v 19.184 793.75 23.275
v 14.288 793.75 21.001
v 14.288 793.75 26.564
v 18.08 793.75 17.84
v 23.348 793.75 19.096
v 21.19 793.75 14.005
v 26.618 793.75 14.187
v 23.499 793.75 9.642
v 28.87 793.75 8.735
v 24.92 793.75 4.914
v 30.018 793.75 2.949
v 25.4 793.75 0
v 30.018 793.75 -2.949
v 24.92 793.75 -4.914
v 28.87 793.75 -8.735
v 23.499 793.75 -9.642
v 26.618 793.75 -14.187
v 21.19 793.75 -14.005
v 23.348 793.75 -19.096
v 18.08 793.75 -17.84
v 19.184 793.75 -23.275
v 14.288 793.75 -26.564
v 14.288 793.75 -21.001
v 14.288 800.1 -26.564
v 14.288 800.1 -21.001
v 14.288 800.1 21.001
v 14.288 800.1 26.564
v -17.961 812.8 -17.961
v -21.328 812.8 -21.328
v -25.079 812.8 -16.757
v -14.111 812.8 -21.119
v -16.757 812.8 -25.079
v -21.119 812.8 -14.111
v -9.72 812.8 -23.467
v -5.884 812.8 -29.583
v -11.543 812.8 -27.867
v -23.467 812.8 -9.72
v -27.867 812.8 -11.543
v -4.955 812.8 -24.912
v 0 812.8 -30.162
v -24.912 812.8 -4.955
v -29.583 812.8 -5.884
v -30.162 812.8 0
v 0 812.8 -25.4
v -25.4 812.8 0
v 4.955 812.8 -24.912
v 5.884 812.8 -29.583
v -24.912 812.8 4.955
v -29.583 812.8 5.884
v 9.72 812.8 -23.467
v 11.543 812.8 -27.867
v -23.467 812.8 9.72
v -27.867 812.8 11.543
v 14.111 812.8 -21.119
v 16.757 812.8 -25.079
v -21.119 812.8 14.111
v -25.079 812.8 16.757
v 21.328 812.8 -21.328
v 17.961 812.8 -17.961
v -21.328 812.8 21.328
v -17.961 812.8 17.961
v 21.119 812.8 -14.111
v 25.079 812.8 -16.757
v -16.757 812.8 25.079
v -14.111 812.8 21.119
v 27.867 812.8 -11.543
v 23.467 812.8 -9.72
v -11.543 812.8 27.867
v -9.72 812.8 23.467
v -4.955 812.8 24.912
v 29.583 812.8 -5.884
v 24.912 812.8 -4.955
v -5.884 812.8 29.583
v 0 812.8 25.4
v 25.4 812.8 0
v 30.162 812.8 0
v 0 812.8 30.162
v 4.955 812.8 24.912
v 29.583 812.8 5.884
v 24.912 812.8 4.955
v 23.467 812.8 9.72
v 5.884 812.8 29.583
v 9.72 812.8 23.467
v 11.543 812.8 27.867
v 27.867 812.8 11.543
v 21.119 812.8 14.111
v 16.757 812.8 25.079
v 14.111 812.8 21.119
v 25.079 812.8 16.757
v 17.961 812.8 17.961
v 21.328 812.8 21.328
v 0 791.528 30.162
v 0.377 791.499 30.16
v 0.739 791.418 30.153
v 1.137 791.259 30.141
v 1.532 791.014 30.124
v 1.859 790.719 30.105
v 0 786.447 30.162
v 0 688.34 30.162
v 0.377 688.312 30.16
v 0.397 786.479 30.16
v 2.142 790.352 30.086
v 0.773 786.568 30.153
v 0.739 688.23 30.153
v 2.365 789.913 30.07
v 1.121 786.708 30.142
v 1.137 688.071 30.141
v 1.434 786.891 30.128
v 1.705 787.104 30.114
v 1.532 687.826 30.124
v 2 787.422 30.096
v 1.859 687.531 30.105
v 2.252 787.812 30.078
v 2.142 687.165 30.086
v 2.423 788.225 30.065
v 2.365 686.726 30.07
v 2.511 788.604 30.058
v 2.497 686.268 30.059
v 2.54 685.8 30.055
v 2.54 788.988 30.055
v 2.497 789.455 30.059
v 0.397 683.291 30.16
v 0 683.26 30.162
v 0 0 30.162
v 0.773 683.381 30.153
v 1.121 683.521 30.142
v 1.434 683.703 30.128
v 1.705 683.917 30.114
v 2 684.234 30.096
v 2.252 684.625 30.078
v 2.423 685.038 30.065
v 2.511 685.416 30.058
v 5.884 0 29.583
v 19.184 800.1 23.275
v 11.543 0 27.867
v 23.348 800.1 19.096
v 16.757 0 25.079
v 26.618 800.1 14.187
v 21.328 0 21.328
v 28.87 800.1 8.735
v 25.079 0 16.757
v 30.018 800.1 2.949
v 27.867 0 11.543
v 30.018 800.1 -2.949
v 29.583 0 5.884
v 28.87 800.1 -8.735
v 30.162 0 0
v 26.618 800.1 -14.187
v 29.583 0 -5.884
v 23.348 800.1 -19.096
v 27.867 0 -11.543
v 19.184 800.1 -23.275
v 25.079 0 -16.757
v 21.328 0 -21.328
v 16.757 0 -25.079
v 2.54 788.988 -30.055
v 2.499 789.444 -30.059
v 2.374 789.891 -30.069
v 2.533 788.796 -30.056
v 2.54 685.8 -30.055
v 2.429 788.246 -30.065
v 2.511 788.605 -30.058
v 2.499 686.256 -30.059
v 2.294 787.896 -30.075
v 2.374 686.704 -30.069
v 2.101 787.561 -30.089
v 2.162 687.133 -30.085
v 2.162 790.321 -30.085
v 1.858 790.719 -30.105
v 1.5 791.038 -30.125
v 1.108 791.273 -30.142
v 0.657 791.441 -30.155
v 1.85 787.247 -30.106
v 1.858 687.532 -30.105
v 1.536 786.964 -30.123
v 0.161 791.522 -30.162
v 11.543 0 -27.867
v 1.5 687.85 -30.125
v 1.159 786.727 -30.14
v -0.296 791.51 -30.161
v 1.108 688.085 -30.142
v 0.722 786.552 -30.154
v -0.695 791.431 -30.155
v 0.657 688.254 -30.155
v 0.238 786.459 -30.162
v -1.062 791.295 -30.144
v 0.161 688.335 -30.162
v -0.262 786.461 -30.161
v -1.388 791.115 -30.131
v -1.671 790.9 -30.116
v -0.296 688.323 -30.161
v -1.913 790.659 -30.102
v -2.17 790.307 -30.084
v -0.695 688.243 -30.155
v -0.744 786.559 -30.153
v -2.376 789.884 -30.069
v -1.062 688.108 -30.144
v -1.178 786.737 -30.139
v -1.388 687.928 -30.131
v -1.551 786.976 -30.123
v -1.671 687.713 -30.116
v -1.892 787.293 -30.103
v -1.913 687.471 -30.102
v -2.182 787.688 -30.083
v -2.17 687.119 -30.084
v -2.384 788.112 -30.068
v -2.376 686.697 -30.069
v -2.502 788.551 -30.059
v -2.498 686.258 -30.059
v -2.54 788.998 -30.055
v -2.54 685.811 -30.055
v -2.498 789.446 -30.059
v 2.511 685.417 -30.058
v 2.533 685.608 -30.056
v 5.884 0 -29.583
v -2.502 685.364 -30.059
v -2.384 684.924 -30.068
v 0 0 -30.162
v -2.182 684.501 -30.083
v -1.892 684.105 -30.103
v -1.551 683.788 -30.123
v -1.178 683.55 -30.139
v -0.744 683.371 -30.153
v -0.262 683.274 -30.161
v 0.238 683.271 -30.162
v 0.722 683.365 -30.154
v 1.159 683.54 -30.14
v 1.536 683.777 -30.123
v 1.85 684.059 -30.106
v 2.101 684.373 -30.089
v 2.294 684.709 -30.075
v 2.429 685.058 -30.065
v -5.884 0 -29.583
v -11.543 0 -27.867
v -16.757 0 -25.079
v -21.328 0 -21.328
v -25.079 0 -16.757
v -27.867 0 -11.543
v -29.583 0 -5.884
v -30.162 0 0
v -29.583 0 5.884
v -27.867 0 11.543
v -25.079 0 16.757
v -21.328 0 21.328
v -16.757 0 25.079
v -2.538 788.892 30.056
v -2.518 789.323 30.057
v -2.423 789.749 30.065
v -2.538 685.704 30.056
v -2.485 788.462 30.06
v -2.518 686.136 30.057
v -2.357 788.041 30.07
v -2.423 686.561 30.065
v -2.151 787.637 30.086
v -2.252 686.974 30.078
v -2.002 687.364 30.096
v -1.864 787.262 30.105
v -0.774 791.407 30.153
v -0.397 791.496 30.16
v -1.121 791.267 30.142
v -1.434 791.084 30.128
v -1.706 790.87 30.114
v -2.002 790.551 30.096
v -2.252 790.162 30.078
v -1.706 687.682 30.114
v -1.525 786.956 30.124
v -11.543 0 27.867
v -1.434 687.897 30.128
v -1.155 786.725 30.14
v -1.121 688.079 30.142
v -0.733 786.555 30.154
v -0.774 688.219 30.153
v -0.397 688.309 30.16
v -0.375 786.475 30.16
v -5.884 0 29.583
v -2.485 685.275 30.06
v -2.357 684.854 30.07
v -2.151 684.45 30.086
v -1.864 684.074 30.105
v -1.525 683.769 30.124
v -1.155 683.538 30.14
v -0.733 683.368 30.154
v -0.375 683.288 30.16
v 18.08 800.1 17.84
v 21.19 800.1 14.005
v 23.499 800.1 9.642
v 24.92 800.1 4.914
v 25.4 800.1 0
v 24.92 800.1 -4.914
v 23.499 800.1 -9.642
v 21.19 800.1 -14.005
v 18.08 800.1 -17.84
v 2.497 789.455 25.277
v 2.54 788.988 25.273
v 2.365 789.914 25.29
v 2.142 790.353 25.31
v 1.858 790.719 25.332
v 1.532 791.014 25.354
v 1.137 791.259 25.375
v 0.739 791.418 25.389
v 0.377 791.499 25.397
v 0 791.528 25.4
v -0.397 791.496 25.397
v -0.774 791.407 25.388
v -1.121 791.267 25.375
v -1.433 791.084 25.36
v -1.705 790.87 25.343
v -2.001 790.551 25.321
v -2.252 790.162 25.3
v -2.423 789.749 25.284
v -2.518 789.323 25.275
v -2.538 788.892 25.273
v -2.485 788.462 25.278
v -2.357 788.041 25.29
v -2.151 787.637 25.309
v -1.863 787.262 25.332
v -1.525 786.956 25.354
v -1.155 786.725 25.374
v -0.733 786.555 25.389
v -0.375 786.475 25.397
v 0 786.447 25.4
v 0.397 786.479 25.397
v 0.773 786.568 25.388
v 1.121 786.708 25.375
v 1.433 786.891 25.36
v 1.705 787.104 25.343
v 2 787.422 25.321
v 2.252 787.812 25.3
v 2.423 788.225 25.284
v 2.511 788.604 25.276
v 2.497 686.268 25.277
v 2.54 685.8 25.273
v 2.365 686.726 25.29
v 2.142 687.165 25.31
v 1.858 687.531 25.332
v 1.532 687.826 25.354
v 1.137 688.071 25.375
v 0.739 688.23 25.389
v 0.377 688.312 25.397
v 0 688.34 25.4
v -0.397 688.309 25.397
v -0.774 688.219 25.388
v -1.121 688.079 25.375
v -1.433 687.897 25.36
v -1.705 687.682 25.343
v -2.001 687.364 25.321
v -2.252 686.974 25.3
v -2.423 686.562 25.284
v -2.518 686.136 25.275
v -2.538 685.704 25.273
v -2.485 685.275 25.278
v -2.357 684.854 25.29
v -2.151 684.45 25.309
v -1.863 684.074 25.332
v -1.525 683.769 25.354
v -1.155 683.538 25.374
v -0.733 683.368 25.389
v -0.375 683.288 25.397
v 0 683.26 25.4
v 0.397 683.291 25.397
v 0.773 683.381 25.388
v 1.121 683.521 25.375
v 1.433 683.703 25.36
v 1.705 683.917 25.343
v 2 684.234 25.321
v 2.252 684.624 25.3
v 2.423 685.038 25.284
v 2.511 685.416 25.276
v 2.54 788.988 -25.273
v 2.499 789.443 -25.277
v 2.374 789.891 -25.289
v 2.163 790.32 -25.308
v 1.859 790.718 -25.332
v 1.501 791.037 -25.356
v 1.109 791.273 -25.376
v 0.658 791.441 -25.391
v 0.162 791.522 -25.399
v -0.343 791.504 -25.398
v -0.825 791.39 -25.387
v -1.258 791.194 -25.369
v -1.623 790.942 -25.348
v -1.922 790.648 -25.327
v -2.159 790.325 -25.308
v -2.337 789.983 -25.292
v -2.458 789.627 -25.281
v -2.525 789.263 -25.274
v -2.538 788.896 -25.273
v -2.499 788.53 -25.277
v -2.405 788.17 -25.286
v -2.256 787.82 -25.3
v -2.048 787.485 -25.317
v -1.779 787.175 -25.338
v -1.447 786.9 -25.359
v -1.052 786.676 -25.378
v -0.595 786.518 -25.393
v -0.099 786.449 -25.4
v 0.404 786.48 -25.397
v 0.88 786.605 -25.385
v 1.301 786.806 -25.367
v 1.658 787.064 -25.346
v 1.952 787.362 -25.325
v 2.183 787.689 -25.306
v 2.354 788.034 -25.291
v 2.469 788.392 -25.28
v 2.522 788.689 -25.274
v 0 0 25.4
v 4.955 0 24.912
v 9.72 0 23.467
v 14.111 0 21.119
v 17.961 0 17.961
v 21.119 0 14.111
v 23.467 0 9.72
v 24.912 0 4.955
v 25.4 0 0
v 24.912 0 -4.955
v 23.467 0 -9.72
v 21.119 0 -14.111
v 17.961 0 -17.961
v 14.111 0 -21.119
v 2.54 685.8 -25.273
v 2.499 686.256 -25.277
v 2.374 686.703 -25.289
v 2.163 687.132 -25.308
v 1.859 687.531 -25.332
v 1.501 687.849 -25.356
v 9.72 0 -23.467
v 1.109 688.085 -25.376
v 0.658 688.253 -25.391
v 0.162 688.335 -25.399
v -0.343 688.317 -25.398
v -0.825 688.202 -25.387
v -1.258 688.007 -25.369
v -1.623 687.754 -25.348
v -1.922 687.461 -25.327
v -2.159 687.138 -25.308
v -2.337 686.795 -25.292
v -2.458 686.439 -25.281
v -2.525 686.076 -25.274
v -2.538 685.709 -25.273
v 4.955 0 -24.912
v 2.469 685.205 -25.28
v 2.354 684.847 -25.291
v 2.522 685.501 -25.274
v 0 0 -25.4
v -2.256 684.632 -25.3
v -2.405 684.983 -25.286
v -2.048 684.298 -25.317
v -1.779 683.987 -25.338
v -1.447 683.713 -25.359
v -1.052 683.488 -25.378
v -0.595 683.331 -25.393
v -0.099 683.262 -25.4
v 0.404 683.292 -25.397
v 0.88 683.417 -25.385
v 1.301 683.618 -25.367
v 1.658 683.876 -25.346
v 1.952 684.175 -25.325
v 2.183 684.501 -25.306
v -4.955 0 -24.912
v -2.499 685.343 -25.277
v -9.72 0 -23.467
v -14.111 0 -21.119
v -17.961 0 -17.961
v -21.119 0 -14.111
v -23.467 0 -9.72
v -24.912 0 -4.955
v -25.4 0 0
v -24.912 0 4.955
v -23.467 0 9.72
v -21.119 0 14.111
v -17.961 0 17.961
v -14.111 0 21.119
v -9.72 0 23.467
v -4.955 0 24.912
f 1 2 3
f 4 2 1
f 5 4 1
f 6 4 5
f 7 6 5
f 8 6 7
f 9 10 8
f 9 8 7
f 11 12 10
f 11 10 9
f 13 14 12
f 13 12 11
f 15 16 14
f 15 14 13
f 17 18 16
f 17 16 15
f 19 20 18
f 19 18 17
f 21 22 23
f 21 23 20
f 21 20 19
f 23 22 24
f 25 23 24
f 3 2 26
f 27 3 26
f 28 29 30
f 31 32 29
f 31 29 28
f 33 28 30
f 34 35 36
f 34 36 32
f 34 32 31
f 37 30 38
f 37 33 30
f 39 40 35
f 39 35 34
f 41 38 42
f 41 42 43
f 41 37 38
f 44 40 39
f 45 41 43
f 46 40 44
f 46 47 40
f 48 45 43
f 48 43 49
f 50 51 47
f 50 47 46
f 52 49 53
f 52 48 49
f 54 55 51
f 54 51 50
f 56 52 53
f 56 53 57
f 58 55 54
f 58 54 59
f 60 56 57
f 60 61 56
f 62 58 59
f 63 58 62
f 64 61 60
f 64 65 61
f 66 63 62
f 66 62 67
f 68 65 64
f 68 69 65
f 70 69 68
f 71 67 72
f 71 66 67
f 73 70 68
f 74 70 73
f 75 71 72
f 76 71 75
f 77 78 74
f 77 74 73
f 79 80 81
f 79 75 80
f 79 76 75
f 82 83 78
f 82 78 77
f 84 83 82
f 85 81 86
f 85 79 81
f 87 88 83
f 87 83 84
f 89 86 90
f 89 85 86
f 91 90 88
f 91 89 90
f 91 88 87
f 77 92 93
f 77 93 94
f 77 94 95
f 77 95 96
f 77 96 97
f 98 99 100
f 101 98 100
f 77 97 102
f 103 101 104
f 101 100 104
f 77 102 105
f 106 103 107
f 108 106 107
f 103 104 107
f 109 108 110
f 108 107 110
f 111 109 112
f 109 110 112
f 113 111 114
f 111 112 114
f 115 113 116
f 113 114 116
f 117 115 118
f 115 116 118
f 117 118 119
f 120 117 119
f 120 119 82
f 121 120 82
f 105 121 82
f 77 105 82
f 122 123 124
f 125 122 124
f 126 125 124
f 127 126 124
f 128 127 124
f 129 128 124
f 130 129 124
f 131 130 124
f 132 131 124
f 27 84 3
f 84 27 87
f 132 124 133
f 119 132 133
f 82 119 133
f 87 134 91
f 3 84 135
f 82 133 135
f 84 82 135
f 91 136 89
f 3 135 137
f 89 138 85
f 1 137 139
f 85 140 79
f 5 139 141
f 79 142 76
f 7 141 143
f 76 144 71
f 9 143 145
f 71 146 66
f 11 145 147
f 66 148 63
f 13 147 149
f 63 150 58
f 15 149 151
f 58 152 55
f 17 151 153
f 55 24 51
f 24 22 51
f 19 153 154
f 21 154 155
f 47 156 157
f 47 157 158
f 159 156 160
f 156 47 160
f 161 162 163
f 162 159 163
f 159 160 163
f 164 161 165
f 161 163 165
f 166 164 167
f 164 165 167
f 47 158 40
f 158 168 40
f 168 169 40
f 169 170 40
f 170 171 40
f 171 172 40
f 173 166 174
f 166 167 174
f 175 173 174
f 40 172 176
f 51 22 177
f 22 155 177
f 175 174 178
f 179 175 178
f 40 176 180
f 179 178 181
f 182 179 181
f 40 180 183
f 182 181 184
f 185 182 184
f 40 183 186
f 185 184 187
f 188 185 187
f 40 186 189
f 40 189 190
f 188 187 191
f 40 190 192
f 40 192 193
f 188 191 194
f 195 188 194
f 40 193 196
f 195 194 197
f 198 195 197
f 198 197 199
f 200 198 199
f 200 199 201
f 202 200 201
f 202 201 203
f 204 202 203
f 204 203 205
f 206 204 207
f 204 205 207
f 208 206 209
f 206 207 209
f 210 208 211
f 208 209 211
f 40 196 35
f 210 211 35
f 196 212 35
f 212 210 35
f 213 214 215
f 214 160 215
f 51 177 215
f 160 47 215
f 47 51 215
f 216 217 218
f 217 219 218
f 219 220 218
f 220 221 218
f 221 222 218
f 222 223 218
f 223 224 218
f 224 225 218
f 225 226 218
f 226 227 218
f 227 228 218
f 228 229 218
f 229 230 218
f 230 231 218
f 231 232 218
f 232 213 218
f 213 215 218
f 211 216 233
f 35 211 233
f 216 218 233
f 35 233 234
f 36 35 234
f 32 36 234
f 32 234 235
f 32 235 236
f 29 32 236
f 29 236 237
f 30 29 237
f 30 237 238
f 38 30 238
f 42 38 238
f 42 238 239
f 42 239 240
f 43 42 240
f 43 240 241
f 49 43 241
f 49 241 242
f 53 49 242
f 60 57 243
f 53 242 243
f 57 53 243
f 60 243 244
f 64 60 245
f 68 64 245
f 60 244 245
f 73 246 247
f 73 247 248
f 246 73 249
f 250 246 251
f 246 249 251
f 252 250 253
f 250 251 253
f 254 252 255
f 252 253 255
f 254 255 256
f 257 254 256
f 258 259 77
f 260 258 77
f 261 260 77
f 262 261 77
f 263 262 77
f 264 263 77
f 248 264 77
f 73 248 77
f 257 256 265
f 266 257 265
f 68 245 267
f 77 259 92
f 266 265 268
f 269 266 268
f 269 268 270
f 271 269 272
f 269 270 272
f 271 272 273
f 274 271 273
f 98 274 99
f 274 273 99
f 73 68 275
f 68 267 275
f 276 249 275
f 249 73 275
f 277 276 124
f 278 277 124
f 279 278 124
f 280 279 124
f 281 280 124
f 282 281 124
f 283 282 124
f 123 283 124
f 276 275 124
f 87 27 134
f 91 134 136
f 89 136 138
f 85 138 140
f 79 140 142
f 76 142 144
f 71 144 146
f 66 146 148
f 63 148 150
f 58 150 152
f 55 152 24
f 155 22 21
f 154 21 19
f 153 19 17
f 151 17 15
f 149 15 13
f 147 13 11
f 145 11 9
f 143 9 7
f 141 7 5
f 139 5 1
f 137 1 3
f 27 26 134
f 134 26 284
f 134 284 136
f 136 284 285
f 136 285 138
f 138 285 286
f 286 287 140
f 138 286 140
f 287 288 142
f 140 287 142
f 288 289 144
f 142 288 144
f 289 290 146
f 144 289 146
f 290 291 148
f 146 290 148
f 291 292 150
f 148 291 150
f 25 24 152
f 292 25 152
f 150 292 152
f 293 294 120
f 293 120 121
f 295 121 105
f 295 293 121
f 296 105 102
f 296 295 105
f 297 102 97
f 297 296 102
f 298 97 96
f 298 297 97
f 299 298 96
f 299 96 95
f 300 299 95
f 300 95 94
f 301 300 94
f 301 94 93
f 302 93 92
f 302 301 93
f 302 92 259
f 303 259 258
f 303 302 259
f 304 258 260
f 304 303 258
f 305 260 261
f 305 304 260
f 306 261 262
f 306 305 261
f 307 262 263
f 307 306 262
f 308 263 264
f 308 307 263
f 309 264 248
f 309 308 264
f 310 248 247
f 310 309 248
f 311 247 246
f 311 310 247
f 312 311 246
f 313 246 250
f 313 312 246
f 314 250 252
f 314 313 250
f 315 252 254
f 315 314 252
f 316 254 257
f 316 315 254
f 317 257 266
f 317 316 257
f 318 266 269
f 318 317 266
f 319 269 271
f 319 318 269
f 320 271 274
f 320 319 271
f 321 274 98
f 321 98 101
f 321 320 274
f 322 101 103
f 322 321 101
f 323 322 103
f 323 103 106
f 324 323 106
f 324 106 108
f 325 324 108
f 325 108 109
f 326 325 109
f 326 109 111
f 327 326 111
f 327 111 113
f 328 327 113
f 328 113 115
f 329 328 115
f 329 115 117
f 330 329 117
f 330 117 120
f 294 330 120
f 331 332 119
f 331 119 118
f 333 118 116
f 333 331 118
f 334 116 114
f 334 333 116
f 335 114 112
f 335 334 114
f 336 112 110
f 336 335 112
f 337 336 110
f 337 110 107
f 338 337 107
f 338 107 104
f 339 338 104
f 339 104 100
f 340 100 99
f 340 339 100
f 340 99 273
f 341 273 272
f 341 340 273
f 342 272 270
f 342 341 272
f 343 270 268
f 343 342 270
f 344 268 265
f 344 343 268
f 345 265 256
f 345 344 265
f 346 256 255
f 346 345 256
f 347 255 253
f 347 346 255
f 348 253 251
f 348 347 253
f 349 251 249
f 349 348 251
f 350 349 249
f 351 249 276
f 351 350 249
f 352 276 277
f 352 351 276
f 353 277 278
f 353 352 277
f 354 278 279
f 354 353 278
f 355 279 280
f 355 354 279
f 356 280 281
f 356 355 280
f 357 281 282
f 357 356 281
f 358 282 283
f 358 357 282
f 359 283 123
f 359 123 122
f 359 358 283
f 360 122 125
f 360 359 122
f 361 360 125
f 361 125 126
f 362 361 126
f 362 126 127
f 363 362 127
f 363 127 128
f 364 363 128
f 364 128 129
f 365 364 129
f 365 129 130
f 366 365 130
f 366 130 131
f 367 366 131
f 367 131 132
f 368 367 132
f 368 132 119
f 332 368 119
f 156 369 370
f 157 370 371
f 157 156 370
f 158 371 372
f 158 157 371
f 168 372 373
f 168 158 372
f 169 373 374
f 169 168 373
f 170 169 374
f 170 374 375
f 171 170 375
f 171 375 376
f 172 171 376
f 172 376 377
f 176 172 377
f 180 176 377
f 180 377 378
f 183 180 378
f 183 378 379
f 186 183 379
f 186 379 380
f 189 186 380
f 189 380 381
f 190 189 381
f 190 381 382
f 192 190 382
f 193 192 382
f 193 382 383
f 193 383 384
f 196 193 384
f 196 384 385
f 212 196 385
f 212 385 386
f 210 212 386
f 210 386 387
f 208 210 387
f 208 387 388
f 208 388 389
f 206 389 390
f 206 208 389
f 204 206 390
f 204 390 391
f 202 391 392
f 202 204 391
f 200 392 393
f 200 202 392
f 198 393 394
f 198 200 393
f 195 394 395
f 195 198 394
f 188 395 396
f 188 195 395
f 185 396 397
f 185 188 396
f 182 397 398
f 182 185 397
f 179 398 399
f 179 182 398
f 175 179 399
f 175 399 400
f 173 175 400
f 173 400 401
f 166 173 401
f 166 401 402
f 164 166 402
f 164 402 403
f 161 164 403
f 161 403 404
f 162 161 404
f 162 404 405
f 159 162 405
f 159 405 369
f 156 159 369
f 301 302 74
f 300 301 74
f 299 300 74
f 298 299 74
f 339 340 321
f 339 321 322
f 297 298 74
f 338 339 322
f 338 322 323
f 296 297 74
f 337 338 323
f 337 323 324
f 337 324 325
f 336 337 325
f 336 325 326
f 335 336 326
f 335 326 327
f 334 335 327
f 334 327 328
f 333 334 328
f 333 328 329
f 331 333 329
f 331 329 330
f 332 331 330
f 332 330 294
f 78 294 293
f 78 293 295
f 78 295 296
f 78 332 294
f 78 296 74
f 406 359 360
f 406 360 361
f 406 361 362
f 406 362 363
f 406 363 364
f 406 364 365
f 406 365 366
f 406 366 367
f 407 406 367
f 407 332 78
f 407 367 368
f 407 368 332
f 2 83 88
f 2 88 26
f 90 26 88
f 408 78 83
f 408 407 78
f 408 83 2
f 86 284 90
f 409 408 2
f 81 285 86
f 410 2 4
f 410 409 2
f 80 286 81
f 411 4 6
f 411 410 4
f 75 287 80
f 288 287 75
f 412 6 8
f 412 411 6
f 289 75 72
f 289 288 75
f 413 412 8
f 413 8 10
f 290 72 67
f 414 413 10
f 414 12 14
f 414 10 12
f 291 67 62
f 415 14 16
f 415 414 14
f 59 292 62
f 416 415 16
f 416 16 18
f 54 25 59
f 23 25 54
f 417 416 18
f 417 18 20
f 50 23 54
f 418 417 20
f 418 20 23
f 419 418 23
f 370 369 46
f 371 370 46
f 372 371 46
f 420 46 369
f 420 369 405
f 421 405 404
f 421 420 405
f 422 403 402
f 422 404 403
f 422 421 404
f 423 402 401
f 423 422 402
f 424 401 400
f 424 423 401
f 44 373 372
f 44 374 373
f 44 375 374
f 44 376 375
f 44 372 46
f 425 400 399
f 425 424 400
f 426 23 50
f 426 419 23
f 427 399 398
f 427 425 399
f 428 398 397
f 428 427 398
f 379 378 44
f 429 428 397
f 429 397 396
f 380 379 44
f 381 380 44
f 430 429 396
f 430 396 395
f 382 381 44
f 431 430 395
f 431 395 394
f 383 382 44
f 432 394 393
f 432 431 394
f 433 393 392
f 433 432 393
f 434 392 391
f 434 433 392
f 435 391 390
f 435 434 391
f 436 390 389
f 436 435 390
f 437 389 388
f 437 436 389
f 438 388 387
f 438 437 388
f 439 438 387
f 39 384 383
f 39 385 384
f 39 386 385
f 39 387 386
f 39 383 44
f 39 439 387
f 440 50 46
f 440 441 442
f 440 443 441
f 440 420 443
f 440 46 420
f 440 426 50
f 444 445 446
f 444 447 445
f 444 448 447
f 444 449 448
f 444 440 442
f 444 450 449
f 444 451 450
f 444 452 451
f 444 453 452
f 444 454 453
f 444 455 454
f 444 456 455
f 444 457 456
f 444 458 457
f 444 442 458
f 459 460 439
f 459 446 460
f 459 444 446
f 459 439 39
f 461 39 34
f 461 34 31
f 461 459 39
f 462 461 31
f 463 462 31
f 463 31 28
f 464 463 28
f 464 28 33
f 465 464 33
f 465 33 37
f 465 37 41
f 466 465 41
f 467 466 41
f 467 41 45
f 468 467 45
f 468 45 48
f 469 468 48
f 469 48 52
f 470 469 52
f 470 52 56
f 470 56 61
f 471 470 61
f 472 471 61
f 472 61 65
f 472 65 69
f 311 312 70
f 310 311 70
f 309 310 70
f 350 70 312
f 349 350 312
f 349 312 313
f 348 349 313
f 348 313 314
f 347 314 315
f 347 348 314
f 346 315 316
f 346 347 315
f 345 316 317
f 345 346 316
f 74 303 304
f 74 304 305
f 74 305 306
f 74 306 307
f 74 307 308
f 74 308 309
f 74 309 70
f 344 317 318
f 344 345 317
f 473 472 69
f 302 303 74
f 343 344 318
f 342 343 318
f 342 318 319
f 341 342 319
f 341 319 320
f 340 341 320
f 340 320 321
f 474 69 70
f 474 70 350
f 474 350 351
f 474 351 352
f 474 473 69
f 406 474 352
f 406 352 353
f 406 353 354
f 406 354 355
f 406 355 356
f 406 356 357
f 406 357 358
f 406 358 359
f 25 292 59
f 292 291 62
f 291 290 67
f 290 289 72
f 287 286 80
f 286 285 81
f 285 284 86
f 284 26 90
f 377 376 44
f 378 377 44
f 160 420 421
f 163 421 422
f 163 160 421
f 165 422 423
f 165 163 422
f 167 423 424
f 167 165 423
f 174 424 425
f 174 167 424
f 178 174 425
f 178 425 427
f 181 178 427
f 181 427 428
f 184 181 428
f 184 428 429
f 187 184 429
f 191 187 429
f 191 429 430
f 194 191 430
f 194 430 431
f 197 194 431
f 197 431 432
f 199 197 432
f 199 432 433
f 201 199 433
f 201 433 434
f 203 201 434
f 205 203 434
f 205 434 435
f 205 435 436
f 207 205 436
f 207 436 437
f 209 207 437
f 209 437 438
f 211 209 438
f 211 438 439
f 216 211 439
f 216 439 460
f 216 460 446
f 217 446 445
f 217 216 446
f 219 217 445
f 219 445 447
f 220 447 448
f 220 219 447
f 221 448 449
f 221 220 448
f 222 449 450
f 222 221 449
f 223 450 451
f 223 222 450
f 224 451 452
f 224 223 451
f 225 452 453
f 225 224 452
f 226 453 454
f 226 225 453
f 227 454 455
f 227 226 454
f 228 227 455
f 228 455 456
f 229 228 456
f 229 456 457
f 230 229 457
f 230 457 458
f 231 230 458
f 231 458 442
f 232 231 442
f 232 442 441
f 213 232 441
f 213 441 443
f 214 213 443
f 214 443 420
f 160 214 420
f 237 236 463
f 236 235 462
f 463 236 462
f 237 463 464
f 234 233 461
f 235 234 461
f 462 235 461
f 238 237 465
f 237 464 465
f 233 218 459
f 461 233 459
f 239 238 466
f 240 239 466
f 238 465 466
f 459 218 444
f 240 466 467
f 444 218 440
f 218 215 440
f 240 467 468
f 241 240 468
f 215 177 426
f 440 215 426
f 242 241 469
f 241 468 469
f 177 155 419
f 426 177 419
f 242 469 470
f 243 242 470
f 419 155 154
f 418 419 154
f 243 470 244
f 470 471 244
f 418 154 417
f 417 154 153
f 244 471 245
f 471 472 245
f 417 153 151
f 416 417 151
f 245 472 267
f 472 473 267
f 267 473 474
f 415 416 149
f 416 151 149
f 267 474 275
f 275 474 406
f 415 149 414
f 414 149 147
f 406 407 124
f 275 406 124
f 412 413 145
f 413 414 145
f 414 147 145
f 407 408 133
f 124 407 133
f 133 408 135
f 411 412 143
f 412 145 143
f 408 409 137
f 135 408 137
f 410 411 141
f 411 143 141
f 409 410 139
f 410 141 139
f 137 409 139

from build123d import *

# Parameters (mm, degrees)
SKETCH1_R               = 30.1625
SKETCH1_R_2             = 25.4
BOSS_EXTRUDE1_DEPTH     = 812.8
CUT_EXTRUDE2_DEPTH      = 814.918541878
CUT_EXTRUDE2_DEPTH_BACK = 814.918541878
SKETCH4_R               = 2.54
SKETCH4_W               = 15.875
SKETCH4_H               = 6.35


with BuildPart() as part:
    # Sketch1 → Boss-Extrude1 (new body)
    with BuildSketch(Plane(origin=(0, 0, 0), x_dir=(1, 0, 0), z_dir=(0, 1, 0))):
        with Locations(Location((0, 0, 0), (0, 0, 270))):
            Circle(SKETCH1_R)
        with Locations(Location((0, 0, 0), (0, 0, 270))):
            Circle(SKETCH1_R_2, mode=Mode.SUBTRACT)
    extrude(amount=BOSS_EXTRUDE1_DEPTH)

    # Sketch4 → Cut-Extrude2 (cut, two sides: drawn at the far end of the back side and taken through both)
    with BuildSketch(Plane.XY.offset(-CUT_EXTRUDE2_DEPTH_BACK)):
        with Locations((0, 685.8)):
            Circle(SKETCH4_R)
        with Locations((0, 788.9875)):
            Circle(SKETCH4_R)
        with Locations((22.225, 796.925)):
            Rectangle(SKETCH4_W, SKETCH4_H)
    extrude(amount=CUT_EXTRUDE2_DEPTH + CUT_EXTRUDE2_DEPTH_BACK, mode=Mode.SUBTRACT)


solid = part.part
